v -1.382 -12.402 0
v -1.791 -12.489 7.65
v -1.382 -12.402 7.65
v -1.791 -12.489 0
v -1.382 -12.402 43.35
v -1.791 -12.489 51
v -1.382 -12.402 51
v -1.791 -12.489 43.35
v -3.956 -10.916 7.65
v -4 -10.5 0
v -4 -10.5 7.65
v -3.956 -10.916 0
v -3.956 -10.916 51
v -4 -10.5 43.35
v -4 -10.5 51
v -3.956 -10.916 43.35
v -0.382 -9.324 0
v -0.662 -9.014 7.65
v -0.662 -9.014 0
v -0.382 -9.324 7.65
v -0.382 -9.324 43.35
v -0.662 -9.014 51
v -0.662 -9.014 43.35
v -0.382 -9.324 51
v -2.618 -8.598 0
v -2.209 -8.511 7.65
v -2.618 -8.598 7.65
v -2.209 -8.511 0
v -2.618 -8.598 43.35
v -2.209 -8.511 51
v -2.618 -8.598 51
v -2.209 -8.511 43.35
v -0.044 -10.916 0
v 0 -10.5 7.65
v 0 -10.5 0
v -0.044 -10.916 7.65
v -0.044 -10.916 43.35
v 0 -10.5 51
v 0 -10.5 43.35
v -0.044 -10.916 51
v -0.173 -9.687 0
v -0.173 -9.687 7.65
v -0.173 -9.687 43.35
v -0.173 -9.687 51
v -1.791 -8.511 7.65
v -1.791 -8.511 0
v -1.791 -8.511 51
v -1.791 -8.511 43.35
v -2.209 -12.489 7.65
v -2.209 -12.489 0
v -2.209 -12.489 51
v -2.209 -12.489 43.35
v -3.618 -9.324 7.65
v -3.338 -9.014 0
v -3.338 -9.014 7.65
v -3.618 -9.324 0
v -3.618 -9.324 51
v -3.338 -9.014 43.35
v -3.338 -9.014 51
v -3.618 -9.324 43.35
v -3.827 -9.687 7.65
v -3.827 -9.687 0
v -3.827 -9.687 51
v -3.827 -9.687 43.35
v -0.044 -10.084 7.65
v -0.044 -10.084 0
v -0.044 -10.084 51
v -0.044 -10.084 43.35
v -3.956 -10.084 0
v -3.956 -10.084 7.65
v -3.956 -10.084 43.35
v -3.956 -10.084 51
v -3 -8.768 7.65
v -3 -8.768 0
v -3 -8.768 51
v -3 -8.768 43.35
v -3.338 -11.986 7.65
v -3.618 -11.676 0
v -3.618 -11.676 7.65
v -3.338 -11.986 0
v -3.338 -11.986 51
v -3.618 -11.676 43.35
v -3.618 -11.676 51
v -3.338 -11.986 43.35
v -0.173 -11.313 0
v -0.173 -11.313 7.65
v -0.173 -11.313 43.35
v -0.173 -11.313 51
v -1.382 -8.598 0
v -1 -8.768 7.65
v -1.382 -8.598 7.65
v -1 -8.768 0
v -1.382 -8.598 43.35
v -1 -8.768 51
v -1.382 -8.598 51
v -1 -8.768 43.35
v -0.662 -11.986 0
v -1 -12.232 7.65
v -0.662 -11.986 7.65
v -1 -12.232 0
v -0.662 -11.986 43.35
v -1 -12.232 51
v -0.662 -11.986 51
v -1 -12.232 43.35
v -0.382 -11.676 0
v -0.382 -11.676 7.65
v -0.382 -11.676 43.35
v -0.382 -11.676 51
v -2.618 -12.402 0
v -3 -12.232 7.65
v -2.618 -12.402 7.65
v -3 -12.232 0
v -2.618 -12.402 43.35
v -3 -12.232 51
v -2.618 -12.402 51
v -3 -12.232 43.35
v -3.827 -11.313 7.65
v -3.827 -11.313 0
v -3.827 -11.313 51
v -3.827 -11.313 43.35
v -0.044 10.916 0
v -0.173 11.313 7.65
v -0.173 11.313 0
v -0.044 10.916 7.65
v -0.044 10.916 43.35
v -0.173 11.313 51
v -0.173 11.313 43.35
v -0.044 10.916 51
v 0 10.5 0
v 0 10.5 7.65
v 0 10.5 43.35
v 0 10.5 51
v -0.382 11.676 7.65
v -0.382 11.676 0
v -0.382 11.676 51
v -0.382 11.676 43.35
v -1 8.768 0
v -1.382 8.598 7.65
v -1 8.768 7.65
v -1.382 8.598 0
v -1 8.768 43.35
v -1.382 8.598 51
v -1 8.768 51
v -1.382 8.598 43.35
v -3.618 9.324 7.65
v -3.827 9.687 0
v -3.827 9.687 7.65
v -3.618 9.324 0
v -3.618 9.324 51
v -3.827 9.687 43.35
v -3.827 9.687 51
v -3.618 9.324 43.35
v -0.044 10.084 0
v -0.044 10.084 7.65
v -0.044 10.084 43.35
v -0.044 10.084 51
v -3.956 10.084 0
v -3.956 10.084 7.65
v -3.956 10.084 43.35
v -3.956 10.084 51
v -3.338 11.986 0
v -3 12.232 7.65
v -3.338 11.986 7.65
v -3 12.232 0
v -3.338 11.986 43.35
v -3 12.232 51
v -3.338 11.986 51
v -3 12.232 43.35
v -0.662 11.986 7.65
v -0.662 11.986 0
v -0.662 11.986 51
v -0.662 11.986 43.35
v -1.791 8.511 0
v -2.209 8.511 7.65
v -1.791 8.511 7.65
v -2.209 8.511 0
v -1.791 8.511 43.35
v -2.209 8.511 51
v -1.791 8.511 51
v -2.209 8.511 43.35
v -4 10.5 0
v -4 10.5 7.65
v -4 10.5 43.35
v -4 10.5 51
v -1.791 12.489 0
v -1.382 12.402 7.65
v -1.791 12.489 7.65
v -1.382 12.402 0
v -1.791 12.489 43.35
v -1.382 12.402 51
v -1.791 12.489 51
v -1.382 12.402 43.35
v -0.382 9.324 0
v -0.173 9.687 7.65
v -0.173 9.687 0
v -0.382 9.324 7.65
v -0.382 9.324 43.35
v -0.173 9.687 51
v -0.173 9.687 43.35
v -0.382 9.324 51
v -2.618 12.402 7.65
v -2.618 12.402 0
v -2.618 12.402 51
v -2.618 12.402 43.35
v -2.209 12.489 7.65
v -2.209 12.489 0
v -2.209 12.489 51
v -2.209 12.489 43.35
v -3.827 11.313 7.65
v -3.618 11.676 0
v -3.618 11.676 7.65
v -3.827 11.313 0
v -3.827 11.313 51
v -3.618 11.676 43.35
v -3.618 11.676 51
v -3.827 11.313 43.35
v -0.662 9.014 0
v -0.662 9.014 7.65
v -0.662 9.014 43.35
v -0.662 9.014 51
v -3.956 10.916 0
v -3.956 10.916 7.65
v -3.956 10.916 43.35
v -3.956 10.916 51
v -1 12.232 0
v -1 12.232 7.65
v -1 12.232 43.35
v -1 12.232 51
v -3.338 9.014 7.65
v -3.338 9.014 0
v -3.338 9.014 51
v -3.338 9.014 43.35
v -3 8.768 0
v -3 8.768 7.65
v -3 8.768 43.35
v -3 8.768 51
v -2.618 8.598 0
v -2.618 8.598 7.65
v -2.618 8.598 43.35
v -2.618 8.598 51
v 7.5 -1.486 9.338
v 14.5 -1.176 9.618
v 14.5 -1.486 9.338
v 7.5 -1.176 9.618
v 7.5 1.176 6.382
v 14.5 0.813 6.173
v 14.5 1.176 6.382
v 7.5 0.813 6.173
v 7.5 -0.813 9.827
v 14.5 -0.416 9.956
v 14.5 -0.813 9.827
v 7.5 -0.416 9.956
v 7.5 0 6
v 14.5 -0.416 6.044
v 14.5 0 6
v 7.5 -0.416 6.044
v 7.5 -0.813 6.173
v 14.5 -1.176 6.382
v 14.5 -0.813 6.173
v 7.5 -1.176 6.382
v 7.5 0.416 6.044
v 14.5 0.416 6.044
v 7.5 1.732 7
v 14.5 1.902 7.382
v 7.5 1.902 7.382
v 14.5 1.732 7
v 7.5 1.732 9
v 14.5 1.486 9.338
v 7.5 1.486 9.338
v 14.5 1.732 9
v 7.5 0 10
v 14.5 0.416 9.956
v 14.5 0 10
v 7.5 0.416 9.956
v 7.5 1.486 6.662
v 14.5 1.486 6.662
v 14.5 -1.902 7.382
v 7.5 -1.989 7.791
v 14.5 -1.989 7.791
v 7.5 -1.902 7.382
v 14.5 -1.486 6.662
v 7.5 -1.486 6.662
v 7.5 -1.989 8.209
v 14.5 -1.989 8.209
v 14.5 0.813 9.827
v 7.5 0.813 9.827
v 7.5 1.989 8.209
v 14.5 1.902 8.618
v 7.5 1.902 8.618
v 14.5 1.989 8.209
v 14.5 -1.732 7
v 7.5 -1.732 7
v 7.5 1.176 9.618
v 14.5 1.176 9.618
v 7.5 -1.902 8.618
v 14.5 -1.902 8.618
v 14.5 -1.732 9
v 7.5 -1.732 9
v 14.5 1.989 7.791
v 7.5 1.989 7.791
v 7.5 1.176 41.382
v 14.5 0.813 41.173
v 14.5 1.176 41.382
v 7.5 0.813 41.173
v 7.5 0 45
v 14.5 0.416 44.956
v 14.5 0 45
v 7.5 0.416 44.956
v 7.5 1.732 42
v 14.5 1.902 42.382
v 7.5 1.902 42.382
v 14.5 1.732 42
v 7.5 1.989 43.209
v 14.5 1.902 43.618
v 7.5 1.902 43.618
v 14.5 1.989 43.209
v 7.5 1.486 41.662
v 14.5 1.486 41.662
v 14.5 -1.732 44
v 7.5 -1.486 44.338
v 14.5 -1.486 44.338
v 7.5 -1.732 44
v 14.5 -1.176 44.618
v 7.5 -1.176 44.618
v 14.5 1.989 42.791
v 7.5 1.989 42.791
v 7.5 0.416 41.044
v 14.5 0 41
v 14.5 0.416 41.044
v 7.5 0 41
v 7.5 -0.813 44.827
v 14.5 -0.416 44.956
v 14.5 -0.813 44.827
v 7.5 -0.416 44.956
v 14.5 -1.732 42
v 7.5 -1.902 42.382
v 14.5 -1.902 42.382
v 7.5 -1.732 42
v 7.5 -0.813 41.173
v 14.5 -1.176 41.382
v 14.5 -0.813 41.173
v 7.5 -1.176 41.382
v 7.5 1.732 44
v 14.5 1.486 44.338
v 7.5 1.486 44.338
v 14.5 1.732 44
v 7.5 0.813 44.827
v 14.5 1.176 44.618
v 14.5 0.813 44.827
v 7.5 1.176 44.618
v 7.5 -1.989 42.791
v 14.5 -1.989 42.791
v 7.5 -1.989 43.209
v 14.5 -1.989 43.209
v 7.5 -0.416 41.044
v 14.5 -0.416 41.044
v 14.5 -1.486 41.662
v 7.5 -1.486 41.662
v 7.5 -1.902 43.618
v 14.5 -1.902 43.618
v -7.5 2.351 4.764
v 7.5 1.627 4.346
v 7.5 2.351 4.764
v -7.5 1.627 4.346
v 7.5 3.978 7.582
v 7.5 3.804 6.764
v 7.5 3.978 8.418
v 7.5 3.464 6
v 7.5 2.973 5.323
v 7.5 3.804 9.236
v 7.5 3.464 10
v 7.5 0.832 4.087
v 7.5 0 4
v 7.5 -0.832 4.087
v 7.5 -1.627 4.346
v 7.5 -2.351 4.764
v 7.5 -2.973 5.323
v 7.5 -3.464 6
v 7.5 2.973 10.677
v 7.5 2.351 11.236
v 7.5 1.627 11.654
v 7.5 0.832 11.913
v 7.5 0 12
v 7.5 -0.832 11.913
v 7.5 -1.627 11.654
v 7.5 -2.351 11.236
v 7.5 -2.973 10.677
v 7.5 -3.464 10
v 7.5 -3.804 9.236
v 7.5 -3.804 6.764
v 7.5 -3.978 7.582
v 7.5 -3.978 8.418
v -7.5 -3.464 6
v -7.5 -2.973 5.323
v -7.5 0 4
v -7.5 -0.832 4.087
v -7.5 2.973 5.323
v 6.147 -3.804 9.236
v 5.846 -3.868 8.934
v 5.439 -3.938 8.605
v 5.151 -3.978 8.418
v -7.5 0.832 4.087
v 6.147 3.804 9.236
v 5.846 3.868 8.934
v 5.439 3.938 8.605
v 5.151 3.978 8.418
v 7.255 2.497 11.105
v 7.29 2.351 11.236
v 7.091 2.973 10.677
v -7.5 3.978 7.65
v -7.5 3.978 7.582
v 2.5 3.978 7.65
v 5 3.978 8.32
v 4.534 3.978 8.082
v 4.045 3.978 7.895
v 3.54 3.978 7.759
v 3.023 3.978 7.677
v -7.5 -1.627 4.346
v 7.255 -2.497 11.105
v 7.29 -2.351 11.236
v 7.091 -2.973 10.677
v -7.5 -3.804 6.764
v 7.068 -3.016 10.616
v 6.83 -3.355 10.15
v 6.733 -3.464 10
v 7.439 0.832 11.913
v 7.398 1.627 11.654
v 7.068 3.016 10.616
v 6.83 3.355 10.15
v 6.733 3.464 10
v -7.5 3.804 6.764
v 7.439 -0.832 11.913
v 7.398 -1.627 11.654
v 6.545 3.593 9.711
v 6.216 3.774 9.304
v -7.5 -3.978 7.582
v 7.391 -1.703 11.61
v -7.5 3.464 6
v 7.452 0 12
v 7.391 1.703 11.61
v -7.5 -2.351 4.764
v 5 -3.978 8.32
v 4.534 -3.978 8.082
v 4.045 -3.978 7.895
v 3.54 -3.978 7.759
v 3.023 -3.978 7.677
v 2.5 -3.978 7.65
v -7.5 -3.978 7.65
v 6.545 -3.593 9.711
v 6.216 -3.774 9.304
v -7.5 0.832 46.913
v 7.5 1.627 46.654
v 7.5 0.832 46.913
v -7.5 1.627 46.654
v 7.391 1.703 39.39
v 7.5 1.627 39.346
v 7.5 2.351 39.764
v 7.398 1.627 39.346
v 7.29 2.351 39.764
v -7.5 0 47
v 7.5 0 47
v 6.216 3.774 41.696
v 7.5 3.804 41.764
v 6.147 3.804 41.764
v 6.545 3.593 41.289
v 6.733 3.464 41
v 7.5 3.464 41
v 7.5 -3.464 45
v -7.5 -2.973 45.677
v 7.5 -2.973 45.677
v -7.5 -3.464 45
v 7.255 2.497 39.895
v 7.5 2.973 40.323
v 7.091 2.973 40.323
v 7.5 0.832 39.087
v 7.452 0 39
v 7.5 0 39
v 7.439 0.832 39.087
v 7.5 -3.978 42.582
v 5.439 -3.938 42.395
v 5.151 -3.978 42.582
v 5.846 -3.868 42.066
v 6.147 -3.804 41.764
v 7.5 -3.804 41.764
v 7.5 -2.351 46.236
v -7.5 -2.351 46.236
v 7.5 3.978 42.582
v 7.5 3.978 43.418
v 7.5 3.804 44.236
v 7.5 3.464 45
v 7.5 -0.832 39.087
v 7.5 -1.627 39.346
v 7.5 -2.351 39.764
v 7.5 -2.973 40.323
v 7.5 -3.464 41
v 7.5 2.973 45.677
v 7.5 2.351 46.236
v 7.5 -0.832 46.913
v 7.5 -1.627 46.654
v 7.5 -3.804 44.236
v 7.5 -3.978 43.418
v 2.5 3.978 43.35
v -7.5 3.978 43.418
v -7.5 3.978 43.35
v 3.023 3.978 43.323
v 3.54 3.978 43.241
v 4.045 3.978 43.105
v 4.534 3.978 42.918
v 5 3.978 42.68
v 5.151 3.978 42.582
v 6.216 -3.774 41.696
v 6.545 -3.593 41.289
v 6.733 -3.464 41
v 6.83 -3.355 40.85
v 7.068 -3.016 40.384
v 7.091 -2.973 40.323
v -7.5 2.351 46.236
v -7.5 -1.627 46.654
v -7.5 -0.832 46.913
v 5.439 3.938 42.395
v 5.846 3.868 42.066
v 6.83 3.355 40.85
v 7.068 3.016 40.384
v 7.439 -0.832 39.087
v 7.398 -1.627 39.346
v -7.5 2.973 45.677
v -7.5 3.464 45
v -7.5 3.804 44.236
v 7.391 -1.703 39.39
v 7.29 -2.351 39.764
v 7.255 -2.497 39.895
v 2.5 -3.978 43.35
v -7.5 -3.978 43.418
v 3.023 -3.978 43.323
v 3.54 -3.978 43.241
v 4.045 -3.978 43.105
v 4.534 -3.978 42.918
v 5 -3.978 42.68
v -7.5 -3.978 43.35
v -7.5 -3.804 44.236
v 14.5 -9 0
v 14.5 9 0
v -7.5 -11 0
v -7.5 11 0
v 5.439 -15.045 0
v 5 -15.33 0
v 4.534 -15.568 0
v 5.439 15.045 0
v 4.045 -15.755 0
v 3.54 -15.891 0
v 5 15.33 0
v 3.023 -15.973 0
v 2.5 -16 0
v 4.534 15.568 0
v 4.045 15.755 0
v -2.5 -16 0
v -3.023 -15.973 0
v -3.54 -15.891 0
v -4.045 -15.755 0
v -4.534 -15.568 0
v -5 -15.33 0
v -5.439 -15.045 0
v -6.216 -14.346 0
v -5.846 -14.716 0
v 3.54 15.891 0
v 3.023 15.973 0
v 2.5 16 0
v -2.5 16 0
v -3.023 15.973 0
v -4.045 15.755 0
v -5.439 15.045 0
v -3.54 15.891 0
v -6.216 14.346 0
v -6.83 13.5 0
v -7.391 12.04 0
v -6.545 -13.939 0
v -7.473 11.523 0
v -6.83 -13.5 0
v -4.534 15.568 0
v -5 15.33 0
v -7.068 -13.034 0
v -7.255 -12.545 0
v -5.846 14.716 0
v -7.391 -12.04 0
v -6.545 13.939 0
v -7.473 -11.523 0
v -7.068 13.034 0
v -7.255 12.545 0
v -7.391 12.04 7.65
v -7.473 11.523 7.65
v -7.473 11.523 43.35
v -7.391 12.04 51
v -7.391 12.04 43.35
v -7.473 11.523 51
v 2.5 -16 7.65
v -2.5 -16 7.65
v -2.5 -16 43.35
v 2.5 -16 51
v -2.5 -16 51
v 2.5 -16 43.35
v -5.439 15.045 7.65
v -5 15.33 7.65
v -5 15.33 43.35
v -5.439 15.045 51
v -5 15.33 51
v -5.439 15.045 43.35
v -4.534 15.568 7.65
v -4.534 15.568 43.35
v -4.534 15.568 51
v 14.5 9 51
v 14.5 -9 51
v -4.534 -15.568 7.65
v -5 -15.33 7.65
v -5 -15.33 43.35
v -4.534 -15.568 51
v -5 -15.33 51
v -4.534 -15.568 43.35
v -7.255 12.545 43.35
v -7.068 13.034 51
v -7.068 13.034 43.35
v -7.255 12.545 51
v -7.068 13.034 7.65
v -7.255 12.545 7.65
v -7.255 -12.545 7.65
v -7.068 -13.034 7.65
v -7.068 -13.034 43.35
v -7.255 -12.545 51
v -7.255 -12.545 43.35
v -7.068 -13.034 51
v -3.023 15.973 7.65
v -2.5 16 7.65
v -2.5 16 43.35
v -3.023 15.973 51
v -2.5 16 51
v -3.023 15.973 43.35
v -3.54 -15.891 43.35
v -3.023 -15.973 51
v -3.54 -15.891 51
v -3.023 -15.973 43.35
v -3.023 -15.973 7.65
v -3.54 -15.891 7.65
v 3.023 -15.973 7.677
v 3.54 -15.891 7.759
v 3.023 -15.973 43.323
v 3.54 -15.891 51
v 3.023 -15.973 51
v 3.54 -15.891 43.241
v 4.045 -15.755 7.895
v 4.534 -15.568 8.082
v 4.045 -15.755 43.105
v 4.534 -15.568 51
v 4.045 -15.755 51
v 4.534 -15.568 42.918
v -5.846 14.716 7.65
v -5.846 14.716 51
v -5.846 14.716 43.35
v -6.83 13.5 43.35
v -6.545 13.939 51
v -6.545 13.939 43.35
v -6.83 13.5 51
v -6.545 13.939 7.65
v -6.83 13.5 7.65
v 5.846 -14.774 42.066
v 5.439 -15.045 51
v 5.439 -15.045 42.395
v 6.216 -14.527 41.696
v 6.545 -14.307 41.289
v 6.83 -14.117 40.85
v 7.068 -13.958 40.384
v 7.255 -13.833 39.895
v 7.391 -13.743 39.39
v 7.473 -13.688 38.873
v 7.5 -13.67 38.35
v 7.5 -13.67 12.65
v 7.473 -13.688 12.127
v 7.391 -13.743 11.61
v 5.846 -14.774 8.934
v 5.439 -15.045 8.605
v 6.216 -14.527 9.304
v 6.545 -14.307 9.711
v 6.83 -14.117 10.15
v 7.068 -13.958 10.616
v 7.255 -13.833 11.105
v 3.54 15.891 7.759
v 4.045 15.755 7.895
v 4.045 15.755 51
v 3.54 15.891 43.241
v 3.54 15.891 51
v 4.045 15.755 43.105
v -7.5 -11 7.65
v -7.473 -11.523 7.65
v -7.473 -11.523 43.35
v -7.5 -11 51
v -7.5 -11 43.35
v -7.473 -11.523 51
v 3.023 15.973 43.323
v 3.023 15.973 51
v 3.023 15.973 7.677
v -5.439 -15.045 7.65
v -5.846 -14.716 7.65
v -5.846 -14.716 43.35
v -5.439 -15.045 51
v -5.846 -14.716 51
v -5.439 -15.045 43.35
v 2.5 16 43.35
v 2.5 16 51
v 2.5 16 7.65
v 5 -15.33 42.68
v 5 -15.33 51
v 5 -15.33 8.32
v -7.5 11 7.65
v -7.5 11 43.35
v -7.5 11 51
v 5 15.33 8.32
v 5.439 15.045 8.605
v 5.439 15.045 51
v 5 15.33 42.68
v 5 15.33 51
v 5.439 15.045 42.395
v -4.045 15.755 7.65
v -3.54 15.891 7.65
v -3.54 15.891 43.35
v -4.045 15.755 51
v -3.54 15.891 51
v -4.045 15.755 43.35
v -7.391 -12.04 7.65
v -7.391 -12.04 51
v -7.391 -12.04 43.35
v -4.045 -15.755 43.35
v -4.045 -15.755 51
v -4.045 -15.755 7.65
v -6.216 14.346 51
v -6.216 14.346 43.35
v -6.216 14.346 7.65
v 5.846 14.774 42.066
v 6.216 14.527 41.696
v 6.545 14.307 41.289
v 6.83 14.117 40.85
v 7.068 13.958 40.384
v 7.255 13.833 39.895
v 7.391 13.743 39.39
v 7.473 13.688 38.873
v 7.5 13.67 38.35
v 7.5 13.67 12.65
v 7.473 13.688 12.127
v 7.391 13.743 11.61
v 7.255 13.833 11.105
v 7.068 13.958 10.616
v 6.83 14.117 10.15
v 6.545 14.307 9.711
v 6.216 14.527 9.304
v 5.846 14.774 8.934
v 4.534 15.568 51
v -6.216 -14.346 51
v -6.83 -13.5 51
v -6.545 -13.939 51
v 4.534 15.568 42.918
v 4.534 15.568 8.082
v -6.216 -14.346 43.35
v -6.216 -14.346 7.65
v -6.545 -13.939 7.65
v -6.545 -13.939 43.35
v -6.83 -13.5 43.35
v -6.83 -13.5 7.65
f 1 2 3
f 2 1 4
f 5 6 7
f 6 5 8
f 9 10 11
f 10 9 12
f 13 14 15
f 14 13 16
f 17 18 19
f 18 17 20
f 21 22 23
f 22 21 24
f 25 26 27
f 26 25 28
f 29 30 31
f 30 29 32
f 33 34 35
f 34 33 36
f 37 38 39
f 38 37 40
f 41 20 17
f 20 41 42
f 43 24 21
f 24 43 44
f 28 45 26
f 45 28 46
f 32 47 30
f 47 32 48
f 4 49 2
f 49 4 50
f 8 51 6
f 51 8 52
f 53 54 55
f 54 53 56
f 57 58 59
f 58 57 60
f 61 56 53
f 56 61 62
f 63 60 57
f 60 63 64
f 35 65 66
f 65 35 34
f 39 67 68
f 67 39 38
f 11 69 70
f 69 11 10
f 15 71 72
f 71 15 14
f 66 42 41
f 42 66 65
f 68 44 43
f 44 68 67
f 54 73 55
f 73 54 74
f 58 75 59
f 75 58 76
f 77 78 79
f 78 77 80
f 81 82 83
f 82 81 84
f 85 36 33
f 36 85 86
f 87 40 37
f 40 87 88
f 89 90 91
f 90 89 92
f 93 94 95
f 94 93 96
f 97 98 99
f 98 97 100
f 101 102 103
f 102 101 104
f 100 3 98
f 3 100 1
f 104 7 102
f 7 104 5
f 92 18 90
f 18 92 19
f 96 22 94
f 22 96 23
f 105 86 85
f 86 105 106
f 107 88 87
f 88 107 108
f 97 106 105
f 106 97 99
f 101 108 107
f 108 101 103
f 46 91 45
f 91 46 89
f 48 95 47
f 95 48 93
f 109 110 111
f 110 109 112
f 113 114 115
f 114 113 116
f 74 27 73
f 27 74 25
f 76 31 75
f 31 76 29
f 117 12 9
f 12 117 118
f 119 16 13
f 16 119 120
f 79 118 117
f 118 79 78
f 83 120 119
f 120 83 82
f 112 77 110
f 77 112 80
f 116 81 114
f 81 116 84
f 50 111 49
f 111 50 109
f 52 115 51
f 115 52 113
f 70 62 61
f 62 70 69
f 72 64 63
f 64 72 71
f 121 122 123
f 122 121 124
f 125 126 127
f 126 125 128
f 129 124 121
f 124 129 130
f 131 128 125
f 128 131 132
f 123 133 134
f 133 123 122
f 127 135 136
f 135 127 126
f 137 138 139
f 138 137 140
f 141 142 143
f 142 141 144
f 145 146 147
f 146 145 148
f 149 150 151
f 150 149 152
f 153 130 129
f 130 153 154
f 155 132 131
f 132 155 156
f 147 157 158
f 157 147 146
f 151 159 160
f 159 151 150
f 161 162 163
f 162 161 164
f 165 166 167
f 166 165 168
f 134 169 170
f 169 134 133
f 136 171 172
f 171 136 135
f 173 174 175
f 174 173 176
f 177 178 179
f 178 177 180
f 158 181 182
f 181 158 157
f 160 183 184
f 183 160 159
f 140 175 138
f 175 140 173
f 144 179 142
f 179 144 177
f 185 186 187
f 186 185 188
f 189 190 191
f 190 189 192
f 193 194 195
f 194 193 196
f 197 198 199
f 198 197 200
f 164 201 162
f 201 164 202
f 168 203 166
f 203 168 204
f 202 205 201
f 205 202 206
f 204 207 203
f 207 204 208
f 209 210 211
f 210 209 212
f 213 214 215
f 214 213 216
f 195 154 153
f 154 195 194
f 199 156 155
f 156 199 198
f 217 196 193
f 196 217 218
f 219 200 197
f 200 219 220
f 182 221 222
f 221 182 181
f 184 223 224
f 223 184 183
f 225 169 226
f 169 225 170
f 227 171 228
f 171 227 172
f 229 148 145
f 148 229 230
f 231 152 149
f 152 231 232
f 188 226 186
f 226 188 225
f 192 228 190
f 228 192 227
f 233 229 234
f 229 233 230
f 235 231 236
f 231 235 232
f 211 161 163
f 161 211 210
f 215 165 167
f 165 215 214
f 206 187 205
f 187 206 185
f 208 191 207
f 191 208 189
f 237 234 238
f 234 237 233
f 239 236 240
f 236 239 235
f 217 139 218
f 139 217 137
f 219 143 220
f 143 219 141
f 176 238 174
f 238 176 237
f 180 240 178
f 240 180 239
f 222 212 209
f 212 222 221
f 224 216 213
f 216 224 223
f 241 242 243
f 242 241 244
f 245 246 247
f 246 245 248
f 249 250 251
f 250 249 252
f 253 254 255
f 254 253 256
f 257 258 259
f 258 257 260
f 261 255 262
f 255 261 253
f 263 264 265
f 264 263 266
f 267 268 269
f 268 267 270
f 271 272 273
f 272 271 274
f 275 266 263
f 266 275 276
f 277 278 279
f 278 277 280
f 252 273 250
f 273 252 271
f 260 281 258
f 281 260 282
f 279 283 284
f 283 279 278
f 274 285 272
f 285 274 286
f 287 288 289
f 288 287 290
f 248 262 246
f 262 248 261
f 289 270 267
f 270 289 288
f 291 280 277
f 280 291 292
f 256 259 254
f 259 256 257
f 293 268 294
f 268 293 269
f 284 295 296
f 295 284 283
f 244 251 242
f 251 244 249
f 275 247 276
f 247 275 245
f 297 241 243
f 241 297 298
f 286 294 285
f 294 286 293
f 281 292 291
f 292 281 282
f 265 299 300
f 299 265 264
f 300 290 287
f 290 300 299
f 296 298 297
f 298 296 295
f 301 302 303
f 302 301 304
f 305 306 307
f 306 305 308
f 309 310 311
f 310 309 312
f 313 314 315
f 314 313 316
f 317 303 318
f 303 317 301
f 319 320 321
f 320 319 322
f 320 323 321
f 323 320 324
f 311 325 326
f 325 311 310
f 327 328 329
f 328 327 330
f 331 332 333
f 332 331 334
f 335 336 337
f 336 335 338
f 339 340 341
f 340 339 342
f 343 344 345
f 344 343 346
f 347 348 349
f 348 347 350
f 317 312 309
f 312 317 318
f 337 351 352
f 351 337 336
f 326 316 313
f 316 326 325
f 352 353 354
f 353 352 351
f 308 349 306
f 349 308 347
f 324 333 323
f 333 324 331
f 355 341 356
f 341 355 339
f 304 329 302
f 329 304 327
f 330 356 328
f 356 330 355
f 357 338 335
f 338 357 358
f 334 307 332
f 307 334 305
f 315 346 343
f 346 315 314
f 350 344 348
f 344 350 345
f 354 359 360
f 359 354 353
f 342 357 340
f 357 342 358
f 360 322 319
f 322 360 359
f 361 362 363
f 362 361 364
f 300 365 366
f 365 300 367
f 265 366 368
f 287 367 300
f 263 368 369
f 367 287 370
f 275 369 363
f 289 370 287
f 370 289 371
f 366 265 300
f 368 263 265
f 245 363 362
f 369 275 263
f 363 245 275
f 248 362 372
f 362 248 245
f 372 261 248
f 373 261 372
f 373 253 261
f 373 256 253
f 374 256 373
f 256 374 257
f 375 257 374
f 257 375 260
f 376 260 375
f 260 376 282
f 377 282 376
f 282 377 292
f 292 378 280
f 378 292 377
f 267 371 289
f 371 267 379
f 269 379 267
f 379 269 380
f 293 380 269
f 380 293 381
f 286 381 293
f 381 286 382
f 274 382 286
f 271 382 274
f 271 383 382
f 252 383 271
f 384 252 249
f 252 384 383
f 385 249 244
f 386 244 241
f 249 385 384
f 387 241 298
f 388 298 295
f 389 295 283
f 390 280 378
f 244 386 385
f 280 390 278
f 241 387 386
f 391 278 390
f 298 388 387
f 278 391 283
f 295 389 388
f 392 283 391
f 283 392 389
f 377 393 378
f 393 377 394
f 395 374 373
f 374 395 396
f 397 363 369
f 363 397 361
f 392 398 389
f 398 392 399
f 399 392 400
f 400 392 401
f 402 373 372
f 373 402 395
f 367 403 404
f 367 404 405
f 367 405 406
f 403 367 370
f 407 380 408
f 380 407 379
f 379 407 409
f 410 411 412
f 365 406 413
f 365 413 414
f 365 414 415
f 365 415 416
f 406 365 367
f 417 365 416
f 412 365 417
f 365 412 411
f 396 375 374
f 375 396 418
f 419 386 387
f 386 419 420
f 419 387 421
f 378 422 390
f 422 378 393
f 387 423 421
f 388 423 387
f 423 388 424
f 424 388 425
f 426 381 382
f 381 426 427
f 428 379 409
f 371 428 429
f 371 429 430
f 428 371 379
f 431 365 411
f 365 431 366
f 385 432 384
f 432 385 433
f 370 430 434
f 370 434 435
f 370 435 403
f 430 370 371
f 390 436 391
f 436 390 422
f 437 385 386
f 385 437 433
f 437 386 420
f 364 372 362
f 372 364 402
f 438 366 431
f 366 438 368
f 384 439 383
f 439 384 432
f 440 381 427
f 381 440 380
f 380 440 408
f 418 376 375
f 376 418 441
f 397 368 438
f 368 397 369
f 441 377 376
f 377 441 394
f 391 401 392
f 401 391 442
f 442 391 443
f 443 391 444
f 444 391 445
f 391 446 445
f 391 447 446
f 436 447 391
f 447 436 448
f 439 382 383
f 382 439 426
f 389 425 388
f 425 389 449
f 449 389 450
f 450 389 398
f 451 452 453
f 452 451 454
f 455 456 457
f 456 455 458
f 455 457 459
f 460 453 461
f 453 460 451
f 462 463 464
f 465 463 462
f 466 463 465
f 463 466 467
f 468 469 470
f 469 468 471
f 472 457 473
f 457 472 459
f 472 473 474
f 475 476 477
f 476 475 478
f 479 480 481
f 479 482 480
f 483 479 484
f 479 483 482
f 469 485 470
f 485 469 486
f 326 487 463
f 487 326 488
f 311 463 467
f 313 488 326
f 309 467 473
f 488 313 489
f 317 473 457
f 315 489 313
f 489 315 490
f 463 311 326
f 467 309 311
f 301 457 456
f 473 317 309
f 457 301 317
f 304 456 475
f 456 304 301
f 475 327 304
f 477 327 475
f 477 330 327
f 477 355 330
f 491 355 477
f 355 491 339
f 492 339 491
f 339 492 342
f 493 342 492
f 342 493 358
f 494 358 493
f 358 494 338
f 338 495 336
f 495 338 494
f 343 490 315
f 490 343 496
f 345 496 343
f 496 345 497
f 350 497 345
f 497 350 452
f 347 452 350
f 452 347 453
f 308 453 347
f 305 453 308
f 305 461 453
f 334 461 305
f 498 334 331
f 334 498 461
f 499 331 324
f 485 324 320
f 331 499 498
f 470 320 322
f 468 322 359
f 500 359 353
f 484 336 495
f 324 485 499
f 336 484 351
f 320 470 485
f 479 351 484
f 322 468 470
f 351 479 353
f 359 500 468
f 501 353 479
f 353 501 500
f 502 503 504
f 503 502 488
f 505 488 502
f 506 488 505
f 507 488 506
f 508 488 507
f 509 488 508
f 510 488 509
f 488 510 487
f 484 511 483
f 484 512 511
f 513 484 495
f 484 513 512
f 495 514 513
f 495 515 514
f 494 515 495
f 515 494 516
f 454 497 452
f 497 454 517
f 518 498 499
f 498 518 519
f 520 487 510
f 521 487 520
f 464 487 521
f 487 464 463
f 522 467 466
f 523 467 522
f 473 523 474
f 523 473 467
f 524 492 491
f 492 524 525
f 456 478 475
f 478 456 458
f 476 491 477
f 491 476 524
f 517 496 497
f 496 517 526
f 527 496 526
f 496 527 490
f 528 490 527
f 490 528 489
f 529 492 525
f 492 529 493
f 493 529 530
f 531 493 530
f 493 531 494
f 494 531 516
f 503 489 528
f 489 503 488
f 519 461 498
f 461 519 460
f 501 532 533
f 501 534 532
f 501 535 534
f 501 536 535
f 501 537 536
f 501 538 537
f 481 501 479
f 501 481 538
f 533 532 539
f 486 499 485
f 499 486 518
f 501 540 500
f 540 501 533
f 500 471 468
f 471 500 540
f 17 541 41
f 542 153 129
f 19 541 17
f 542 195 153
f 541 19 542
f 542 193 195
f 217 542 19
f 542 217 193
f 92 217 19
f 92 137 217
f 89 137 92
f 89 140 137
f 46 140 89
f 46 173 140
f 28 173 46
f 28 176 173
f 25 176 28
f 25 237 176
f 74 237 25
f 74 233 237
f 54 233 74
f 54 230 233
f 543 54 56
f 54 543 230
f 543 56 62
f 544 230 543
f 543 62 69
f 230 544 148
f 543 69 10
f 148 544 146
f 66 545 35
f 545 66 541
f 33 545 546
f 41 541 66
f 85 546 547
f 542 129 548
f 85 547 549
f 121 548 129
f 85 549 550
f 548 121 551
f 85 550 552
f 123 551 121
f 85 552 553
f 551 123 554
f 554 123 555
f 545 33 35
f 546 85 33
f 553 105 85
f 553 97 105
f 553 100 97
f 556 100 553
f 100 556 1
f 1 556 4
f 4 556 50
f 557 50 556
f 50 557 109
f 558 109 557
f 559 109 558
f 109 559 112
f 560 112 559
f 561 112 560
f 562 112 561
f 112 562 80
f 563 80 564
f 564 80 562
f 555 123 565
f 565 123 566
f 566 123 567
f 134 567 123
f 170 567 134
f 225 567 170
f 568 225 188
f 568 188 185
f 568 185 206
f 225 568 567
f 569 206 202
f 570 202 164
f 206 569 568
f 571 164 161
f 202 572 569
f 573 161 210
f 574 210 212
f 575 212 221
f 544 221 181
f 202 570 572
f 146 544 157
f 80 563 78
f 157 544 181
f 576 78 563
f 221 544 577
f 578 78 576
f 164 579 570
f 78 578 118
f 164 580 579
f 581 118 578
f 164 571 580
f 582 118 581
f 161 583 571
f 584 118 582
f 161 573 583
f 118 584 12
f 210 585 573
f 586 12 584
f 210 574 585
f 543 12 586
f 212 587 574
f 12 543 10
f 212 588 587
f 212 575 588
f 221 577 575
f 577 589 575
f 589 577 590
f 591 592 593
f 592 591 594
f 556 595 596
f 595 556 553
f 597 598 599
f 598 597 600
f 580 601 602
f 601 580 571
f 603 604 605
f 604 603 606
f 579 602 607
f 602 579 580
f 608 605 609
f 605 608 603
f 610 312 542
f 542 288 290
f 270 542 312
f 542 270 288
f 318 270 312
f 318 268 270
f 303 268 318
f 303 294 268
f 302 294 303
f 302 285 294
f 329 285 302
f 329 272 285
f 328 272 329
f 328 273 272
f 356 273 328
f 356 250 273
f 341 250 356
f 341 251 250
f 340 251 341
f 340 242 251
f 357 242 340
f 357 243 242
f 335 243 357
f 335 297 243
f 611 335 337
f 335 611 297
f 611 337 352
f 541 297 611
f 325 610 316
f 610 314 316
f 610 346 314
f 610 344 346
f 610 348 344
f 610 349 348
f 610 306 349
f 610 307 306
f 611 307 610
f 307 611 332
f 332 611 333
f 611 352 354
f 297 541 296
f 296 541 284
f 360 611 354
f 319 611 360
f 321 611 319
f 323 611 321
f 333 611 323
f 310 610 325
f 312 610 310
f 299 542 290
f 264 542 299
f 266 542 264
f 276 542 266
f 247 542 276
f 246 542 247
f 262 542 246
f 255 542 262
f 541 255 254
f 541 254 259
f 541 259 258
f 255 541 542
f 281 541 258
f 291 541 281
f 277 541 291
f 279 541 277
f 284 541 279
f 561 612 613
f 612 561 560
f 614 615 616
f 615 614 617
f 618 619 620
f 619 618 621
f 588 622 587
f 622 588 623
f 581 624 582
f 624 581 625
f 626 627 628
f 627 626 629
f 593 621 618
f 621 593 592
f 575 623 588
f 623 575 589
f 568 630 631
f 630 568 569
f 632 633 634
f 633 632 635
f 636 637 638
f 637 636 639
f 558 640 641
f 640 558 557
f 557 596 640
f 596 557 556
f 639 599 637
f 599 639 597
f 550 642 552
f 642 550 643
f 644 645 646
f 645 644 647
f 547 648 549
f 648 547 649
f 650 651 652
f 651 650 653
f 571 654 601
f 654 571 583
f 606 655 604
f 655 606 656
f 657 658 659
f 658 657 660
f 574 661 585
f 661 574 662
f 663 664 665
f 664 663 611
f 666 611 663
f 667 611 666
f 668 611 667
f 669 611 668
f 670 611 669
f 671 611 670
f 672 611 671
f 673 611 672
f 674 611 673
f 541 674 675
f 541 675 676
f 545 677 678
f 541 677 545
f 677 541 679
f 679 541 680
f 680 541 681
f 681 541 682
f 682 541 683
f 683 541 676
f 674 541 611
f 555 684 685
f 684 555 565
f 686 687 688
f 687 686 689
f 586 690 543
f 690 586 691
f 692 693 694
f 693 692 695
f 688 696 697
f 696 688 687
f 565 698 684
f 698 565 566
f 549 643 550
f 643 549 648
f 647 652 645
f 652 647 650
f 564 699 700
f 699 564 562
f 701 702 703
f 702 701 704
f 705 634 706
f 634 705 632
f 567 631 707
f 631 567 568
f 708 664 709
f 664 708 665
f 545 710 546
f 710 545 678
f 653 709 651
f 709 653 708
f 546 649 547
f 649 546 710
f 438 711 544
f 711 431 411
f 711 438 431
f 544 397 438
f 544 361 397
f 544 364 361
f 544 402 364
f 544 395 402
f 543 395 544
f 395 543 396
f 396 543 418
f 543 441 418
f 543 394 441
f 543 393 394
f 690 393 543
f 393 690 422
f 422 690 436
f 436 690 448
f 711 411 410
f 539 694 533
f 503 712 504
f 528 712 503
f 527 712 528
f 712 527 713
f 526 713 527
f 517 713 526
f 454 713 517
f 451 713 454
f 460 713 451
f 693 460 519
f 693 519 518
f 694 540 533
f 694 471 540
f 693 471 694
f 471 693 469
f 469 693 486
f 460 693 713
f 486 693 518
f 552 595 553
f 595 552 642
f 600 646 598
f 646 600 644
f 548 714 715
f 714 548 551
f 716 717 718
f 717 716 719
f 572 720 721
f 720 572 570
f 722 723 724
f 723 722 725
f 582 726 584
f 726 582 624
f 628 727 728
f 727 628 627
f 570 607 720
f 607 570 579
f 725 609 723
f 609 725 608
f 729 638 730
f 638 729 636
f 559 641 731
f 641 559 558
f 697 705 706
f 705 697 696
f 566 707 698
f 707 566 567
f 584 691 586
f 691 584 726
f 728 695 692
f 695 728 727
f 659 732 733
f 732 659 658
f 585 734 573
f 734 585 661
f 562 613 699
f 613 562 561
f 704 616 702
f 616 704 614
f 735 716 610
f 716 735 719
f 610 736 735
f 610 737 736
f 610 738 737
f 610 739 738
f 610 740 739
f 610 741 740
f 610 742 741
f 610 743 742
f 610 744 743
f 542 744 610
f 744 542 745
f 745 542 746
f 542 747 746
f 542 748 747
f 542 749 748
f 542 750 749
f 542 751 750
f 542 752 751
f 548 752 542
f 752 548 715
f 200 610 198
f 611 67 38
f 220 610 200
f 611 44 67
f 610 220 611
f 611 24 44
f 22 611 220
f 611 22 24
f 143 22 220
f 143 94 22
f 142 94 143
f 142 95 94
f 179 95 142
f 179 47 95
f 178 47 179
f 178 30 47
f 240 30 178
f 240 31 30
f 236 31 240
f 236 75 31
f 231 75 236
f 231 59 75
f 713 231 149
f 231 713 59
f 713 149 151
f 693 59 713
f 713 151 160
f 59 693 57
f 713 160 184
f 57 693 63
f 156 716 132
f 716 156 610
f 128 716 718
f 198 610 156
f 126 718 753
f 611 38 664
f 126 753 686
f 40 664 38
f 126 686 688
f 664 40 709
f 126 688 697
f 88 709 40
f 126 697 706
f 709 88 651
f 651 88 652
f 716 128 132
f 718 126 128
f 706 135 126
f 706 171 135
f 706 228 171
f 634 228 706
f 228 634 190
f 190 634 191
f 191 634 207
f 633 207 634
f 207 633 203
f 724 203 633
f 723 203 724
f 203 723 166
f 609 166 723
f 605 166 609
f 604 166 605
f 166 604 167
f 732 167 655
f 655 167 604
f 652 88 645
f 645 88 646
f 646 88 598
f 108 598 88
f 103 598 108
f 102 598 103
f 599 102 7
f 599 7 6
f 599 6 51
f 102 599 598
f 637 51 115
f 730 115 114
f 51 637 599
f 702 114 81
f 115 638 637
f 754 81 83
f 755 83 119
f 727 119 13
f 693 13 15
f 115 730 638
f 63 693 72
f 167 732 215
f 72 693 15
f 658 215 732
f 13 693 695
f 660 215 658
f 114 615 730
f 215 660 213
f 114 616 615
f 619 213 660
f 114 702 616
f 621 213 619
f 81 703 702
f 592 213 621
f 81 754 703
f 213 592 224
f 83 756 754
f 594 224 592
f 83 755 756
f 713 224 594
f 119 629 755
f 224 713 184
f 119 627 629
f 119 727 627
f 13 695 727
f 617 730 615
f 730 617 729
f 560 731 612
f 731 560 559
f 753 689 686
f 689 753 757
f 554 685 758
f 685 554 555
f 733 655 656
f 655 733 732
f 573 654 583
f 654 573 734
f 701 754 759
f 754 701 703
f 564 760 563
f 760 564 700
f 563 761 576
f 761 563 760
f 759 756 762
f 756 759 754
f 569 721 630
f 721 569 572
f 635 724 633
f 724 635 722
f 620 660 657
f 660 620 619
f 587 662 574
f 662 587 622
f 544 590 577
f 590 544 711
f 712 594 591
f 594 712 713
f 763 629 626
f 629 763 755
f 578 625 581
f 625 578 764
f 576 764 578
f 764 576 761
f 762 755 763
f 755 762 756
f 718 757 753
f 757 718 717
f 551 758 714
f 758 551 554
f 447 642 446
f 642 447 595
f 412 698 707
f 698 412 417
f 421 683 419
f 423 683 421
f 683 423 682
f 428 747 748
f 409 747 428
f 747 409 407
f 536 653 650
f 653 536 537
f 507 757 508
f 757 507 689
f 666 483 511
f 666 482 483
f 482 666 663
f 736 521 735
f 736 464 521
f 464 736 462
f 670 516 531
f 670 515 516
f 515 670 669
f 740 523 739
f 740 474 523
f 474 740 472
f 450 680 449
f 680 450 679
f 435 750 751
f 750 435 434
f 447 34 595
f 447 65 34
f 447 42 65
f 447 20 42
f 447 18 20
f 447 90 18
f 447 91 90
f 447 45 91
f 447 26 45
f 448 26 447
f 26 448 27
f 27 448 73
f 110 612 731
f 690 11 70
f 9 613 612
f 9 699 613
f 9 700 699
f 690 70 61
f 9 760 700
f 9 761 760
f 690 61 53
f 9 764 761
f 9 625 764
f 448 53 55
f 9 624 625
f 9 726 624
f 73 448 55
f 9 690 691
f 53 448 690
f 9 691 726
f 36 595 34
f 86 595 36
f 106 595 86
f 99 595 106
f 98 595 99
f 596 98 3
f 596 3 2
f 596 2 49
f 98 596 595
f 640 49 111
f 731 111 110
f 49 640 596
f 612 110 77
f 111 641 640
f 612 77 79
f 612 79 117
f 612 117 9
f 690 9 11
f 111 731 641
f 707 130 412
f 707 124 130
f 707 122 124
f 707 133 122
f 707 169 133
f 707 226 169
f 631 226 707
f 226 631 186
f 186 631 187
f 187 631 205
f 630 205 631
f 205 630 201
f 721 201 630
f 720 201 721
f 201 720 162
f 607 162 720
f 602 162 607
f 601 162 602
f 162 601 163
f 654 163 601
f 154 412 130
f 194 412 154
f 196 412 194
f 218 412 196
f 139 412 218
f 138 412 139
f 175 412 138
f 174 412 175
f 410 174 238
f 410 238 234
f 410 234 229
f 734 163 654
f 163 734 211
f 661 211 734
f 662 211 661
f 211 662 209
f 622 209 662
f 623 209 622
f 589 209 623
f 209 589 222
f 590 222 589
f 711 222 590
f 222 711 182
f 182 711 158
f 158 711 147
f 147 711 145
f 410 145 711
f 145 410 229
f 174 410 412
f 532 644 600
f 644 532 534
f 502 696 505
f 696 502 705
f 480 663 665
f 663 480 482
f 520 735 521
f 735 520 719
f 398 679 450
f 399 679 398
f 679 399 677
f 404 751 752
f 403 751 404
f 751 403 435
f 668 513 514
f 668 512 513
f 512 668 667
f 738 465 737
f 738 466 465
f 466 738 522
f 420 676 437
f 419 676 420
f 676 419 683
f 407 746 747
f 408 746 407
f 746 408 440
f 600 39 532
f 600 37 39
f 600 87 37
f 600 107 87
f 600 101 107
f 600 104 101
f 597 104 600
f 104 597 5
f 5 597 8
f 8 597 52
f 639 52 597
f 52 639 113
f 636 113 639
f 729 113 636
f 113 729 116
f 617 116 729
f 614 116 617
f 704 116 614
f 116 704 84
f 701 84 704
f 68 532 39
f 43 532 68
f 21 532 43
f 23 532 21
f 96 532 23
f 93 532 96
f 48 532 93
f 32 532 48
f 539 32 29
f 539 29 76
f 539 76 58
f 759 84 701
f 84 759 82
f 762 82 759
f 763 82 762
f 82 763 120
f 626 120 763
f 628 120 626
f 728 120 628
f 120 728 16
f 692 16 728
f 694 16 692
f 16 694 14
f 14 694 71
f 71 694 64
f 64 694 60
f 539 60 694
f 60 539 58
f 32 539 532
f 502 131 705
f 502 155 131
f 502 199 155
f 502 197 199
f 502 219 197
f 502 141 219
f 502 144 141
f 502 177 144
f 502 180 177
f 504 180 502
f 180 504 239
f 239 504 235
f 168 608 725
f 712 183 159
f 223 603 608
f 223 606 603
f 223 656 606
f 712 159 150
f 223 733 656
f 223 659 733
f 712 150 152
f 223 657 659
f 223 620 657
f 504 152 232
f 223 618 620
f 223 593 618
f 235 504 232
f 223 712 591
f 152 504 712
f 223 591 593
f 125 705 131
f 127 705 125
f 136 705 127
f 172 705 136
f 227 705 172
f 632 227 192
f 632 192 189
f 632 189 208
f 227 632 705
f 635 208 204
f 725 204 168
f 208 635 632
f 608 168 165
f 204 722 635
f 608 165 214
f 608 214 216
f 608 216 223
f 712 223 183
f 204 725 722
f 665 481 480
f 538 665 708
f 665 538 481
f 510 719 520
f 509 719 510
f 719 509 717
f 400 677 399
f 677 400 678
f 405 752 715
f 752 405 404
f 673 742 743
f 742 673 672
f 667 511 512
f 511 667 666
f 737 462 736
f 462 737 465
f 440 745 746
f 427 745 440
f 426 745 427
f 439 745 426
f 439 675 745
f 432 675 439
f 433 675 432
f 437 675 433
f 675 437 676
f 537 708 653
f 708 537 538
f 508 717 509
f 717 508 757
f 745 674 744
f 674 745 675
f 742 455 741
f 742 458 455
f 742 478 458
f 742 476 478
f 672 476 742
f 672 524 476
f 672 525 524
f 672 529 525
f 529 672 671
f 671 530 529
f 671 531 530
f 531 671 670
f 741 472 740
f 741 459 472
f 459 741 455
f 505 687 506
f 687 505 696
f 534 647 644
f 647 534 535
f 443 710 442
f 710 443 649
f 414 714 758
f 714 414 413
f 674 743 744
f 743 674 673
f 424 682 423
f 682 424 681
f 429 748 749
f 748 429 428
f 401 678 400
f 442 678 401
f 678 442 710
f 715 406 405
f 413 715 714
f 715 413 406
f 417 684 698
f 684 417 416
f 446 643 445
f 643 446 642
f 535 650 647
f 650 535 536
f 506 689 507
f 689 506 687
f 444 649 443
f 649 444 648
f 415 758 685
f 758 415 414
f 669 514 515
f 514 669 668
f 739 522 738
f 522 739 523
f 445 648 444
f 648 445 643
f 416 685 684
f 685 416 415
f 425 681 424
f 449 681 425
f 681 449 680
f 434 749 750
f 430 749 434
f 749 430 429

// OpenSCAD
// file: functions.scad
// -----------------------------------------------------
// Utility: squircle (circle + rectangle)
// -----------------------------------------------------

module squircle(radius, foot, segments) {
    union() {
        circle(r = radius, $fn = segments);
        translate([-(radius + foot) / 2, 0, 0])
            square([foot + radius, 2 * radius], center = true);
    }
}

//
// 2D rounded rectangle centered optionally on X/Y.
//
module rounded_rect(l, w, r, center=false, xcenter=false, ycenter=false) {
    translate([
        (center || xcenter) ? -l/2 : 0,
        (center || ycenter) ? -w/2 : 0
    ])
    translate([r, r])
        offset(r = r, $fn = 60)
            // Core rectangle; note that rounding eats 2*r in both directions
            square([l - 2*r, w - 2*r]);
}
// main file
//
// Buildplate holder designed for Anycubic Photon Mono 4K printer
// It is shorter than the original manufacturer buildplate, allowing to print
// on a part stuck to the buildplate (e.g. bare PCB, wood...)
// Author: <bluesyann>
// License: <MIT>
//
include <functions.scad>

// =======================
// Global parameters
// =======================

// Parameter to adjust to the media thickness
// setting it to 0 will match the orignial manufacturer's part
media_thck   = 10;

// Geometry
r_round      = 5;   // Radius of rounded corners

length       = 51;  // Overall length of the object (Z)
w_top        = 32;  // Width of the top part tied to the actuator (Y)
w_bot        = 18;  // Width of the bottom part fixed to the build plate (Y)
h_top        = 15;  // Height of the top part (X)
h_bot_origin = 17;
h_bot        = h_bot_origin-media_thck;   // Height of the bottom part (X) 15 ok

// Horizontal holes (along Z)
h_hole_r     = 2;
h_hole_span  = 21;
h_hole_shift = 5.5;

// Vertical holes (along X)
v_hole_r     = 2;
v_hole_span  = 35;
counterbore_r= 4;
screw_depth  = 7;

// Cutaway
cut_ratio    = 0.7; // Fraction of total length removed by the cutaway



// =======================
// 2D profile (X–Y) to be extruded along Z
// =======================
//
// Top rounded rectangle + bottom rectangular “tab”.
//
module profile() {
    shift_bot_x = h_top/2 + h_bot/2;

    difference() {
        union() {
            // Top rounded actuator section, centered at origin
            rounded_rect(
                l = h_top,
                w = w_top,
                r = r_round,
                center = true
            );

            // Bottom rectangular section, attached on +X side
            translate([shift_bot_x, 0])
                square([h_bot, w_bot], center = true);
        }
    }
}



// =======================
// Horizontal mounting holes (along Z)
// =======================
//
// Two cylinders, symmetric in Y, going through full length.
//
module horizontal_holes() {
    holes_length = 3 * length;

    translate([h_hole_shift-h_top/2, -h_hole_span/2, -length])
        union() {
            cylinder(h = holes_length, r = h_hole_r, $fn = 30);

            translate([0, h_hole_span, 0])
                cylinder(h = holes_length, r = h_hole_r, $fn = 30);
        }
}



// =======================
// Cutaway (angled slot through the body)
// =======================
//
// A rounded rectangle extruded and rotated to remove a chunk of the part.
//
module cutaway() {
    w = cut_ratio * length;       // Cut depth (Z)
    l = 2 * h_top;                // Cut length (X)

    translate([
        -l + h_top/2,             // Shift back so cut starts near origin in X
        w_top,                    // Shift above center in Y
        (1 - cut_ratio) * length/2
    ])
    rotate(90, [1, 0, 0])
        linear_extrude(height = 2 * w_top)
            rounded_rect(l = l, w = w, r = r_round);
}



// =======================
// Vertical through‑holes (along X)
// =======================
//
// Two cylinders, symmetric in Z, going across the X dimension.
//
module vertical_holes() {
    holes_length = 2 * (h_bot + h_top);

    translate([
        -holes_length/2,          // Center along X
        0,                        // Center along Y
        (length - v_hole_span)/2  // Position in Z
    ])
    union() {
        // First vertical hole
        rotate(a = 90, v = [0, 1, 0])
            cylinder(h = holes_length, r = v_hole_r, $fn = 30);

        // Second vertical hole
        translate([0, 0, v_hole_span])
            rotate(a = 90, v = [0, 1, 0])
                cylinder(h = holes_length, r = v_hole_r, $fn = 30);
    }
}

// =======================
// Vertical counterbores (along X)
// =======================
//
// Two cylinders, symmetric in Z, going across the X dimension.
// We need a thickness of (screw_depth) mm between the head and the buidplate face
//
module vertical_counterbores() {
    holes_length = h_top+14;

    translate([
        -holes_length+h_bot+h_top/2-screw_depth,          // Center along X
        0,                        // Center along Y
        (length - v_hole_span)/2  // Position in Z
    ])
    union() {
        // First vertical hole
        rotate(a = 90, v = [0, 1, 0])
            cylinder(h = holes_length, r = counterbore_r, $fn = 30);

        // Second vertical hole
        translate([0, 0, v_hole_span])
            rotate(a = 90, v = [0, 1, 0])
                cylinder(h = holes_length, r = counterbore_r, $fn = 30);
    }
}


// =======================
// Main body
// =======================
//
// Hull of the extruded profile, minus all cut features.
//
module actuator_mount() {
    difference() {
        // Solid body
        hull() {
            linear_extrude(height = length)
                profile();
        }

        // Subtracted features
        horizontal_holes();
        cutaway();
        vertical_holes();
        vertical_counterbores();
    }
}



// =======================
// Top‑level call
// =======================

actuator_mount();
